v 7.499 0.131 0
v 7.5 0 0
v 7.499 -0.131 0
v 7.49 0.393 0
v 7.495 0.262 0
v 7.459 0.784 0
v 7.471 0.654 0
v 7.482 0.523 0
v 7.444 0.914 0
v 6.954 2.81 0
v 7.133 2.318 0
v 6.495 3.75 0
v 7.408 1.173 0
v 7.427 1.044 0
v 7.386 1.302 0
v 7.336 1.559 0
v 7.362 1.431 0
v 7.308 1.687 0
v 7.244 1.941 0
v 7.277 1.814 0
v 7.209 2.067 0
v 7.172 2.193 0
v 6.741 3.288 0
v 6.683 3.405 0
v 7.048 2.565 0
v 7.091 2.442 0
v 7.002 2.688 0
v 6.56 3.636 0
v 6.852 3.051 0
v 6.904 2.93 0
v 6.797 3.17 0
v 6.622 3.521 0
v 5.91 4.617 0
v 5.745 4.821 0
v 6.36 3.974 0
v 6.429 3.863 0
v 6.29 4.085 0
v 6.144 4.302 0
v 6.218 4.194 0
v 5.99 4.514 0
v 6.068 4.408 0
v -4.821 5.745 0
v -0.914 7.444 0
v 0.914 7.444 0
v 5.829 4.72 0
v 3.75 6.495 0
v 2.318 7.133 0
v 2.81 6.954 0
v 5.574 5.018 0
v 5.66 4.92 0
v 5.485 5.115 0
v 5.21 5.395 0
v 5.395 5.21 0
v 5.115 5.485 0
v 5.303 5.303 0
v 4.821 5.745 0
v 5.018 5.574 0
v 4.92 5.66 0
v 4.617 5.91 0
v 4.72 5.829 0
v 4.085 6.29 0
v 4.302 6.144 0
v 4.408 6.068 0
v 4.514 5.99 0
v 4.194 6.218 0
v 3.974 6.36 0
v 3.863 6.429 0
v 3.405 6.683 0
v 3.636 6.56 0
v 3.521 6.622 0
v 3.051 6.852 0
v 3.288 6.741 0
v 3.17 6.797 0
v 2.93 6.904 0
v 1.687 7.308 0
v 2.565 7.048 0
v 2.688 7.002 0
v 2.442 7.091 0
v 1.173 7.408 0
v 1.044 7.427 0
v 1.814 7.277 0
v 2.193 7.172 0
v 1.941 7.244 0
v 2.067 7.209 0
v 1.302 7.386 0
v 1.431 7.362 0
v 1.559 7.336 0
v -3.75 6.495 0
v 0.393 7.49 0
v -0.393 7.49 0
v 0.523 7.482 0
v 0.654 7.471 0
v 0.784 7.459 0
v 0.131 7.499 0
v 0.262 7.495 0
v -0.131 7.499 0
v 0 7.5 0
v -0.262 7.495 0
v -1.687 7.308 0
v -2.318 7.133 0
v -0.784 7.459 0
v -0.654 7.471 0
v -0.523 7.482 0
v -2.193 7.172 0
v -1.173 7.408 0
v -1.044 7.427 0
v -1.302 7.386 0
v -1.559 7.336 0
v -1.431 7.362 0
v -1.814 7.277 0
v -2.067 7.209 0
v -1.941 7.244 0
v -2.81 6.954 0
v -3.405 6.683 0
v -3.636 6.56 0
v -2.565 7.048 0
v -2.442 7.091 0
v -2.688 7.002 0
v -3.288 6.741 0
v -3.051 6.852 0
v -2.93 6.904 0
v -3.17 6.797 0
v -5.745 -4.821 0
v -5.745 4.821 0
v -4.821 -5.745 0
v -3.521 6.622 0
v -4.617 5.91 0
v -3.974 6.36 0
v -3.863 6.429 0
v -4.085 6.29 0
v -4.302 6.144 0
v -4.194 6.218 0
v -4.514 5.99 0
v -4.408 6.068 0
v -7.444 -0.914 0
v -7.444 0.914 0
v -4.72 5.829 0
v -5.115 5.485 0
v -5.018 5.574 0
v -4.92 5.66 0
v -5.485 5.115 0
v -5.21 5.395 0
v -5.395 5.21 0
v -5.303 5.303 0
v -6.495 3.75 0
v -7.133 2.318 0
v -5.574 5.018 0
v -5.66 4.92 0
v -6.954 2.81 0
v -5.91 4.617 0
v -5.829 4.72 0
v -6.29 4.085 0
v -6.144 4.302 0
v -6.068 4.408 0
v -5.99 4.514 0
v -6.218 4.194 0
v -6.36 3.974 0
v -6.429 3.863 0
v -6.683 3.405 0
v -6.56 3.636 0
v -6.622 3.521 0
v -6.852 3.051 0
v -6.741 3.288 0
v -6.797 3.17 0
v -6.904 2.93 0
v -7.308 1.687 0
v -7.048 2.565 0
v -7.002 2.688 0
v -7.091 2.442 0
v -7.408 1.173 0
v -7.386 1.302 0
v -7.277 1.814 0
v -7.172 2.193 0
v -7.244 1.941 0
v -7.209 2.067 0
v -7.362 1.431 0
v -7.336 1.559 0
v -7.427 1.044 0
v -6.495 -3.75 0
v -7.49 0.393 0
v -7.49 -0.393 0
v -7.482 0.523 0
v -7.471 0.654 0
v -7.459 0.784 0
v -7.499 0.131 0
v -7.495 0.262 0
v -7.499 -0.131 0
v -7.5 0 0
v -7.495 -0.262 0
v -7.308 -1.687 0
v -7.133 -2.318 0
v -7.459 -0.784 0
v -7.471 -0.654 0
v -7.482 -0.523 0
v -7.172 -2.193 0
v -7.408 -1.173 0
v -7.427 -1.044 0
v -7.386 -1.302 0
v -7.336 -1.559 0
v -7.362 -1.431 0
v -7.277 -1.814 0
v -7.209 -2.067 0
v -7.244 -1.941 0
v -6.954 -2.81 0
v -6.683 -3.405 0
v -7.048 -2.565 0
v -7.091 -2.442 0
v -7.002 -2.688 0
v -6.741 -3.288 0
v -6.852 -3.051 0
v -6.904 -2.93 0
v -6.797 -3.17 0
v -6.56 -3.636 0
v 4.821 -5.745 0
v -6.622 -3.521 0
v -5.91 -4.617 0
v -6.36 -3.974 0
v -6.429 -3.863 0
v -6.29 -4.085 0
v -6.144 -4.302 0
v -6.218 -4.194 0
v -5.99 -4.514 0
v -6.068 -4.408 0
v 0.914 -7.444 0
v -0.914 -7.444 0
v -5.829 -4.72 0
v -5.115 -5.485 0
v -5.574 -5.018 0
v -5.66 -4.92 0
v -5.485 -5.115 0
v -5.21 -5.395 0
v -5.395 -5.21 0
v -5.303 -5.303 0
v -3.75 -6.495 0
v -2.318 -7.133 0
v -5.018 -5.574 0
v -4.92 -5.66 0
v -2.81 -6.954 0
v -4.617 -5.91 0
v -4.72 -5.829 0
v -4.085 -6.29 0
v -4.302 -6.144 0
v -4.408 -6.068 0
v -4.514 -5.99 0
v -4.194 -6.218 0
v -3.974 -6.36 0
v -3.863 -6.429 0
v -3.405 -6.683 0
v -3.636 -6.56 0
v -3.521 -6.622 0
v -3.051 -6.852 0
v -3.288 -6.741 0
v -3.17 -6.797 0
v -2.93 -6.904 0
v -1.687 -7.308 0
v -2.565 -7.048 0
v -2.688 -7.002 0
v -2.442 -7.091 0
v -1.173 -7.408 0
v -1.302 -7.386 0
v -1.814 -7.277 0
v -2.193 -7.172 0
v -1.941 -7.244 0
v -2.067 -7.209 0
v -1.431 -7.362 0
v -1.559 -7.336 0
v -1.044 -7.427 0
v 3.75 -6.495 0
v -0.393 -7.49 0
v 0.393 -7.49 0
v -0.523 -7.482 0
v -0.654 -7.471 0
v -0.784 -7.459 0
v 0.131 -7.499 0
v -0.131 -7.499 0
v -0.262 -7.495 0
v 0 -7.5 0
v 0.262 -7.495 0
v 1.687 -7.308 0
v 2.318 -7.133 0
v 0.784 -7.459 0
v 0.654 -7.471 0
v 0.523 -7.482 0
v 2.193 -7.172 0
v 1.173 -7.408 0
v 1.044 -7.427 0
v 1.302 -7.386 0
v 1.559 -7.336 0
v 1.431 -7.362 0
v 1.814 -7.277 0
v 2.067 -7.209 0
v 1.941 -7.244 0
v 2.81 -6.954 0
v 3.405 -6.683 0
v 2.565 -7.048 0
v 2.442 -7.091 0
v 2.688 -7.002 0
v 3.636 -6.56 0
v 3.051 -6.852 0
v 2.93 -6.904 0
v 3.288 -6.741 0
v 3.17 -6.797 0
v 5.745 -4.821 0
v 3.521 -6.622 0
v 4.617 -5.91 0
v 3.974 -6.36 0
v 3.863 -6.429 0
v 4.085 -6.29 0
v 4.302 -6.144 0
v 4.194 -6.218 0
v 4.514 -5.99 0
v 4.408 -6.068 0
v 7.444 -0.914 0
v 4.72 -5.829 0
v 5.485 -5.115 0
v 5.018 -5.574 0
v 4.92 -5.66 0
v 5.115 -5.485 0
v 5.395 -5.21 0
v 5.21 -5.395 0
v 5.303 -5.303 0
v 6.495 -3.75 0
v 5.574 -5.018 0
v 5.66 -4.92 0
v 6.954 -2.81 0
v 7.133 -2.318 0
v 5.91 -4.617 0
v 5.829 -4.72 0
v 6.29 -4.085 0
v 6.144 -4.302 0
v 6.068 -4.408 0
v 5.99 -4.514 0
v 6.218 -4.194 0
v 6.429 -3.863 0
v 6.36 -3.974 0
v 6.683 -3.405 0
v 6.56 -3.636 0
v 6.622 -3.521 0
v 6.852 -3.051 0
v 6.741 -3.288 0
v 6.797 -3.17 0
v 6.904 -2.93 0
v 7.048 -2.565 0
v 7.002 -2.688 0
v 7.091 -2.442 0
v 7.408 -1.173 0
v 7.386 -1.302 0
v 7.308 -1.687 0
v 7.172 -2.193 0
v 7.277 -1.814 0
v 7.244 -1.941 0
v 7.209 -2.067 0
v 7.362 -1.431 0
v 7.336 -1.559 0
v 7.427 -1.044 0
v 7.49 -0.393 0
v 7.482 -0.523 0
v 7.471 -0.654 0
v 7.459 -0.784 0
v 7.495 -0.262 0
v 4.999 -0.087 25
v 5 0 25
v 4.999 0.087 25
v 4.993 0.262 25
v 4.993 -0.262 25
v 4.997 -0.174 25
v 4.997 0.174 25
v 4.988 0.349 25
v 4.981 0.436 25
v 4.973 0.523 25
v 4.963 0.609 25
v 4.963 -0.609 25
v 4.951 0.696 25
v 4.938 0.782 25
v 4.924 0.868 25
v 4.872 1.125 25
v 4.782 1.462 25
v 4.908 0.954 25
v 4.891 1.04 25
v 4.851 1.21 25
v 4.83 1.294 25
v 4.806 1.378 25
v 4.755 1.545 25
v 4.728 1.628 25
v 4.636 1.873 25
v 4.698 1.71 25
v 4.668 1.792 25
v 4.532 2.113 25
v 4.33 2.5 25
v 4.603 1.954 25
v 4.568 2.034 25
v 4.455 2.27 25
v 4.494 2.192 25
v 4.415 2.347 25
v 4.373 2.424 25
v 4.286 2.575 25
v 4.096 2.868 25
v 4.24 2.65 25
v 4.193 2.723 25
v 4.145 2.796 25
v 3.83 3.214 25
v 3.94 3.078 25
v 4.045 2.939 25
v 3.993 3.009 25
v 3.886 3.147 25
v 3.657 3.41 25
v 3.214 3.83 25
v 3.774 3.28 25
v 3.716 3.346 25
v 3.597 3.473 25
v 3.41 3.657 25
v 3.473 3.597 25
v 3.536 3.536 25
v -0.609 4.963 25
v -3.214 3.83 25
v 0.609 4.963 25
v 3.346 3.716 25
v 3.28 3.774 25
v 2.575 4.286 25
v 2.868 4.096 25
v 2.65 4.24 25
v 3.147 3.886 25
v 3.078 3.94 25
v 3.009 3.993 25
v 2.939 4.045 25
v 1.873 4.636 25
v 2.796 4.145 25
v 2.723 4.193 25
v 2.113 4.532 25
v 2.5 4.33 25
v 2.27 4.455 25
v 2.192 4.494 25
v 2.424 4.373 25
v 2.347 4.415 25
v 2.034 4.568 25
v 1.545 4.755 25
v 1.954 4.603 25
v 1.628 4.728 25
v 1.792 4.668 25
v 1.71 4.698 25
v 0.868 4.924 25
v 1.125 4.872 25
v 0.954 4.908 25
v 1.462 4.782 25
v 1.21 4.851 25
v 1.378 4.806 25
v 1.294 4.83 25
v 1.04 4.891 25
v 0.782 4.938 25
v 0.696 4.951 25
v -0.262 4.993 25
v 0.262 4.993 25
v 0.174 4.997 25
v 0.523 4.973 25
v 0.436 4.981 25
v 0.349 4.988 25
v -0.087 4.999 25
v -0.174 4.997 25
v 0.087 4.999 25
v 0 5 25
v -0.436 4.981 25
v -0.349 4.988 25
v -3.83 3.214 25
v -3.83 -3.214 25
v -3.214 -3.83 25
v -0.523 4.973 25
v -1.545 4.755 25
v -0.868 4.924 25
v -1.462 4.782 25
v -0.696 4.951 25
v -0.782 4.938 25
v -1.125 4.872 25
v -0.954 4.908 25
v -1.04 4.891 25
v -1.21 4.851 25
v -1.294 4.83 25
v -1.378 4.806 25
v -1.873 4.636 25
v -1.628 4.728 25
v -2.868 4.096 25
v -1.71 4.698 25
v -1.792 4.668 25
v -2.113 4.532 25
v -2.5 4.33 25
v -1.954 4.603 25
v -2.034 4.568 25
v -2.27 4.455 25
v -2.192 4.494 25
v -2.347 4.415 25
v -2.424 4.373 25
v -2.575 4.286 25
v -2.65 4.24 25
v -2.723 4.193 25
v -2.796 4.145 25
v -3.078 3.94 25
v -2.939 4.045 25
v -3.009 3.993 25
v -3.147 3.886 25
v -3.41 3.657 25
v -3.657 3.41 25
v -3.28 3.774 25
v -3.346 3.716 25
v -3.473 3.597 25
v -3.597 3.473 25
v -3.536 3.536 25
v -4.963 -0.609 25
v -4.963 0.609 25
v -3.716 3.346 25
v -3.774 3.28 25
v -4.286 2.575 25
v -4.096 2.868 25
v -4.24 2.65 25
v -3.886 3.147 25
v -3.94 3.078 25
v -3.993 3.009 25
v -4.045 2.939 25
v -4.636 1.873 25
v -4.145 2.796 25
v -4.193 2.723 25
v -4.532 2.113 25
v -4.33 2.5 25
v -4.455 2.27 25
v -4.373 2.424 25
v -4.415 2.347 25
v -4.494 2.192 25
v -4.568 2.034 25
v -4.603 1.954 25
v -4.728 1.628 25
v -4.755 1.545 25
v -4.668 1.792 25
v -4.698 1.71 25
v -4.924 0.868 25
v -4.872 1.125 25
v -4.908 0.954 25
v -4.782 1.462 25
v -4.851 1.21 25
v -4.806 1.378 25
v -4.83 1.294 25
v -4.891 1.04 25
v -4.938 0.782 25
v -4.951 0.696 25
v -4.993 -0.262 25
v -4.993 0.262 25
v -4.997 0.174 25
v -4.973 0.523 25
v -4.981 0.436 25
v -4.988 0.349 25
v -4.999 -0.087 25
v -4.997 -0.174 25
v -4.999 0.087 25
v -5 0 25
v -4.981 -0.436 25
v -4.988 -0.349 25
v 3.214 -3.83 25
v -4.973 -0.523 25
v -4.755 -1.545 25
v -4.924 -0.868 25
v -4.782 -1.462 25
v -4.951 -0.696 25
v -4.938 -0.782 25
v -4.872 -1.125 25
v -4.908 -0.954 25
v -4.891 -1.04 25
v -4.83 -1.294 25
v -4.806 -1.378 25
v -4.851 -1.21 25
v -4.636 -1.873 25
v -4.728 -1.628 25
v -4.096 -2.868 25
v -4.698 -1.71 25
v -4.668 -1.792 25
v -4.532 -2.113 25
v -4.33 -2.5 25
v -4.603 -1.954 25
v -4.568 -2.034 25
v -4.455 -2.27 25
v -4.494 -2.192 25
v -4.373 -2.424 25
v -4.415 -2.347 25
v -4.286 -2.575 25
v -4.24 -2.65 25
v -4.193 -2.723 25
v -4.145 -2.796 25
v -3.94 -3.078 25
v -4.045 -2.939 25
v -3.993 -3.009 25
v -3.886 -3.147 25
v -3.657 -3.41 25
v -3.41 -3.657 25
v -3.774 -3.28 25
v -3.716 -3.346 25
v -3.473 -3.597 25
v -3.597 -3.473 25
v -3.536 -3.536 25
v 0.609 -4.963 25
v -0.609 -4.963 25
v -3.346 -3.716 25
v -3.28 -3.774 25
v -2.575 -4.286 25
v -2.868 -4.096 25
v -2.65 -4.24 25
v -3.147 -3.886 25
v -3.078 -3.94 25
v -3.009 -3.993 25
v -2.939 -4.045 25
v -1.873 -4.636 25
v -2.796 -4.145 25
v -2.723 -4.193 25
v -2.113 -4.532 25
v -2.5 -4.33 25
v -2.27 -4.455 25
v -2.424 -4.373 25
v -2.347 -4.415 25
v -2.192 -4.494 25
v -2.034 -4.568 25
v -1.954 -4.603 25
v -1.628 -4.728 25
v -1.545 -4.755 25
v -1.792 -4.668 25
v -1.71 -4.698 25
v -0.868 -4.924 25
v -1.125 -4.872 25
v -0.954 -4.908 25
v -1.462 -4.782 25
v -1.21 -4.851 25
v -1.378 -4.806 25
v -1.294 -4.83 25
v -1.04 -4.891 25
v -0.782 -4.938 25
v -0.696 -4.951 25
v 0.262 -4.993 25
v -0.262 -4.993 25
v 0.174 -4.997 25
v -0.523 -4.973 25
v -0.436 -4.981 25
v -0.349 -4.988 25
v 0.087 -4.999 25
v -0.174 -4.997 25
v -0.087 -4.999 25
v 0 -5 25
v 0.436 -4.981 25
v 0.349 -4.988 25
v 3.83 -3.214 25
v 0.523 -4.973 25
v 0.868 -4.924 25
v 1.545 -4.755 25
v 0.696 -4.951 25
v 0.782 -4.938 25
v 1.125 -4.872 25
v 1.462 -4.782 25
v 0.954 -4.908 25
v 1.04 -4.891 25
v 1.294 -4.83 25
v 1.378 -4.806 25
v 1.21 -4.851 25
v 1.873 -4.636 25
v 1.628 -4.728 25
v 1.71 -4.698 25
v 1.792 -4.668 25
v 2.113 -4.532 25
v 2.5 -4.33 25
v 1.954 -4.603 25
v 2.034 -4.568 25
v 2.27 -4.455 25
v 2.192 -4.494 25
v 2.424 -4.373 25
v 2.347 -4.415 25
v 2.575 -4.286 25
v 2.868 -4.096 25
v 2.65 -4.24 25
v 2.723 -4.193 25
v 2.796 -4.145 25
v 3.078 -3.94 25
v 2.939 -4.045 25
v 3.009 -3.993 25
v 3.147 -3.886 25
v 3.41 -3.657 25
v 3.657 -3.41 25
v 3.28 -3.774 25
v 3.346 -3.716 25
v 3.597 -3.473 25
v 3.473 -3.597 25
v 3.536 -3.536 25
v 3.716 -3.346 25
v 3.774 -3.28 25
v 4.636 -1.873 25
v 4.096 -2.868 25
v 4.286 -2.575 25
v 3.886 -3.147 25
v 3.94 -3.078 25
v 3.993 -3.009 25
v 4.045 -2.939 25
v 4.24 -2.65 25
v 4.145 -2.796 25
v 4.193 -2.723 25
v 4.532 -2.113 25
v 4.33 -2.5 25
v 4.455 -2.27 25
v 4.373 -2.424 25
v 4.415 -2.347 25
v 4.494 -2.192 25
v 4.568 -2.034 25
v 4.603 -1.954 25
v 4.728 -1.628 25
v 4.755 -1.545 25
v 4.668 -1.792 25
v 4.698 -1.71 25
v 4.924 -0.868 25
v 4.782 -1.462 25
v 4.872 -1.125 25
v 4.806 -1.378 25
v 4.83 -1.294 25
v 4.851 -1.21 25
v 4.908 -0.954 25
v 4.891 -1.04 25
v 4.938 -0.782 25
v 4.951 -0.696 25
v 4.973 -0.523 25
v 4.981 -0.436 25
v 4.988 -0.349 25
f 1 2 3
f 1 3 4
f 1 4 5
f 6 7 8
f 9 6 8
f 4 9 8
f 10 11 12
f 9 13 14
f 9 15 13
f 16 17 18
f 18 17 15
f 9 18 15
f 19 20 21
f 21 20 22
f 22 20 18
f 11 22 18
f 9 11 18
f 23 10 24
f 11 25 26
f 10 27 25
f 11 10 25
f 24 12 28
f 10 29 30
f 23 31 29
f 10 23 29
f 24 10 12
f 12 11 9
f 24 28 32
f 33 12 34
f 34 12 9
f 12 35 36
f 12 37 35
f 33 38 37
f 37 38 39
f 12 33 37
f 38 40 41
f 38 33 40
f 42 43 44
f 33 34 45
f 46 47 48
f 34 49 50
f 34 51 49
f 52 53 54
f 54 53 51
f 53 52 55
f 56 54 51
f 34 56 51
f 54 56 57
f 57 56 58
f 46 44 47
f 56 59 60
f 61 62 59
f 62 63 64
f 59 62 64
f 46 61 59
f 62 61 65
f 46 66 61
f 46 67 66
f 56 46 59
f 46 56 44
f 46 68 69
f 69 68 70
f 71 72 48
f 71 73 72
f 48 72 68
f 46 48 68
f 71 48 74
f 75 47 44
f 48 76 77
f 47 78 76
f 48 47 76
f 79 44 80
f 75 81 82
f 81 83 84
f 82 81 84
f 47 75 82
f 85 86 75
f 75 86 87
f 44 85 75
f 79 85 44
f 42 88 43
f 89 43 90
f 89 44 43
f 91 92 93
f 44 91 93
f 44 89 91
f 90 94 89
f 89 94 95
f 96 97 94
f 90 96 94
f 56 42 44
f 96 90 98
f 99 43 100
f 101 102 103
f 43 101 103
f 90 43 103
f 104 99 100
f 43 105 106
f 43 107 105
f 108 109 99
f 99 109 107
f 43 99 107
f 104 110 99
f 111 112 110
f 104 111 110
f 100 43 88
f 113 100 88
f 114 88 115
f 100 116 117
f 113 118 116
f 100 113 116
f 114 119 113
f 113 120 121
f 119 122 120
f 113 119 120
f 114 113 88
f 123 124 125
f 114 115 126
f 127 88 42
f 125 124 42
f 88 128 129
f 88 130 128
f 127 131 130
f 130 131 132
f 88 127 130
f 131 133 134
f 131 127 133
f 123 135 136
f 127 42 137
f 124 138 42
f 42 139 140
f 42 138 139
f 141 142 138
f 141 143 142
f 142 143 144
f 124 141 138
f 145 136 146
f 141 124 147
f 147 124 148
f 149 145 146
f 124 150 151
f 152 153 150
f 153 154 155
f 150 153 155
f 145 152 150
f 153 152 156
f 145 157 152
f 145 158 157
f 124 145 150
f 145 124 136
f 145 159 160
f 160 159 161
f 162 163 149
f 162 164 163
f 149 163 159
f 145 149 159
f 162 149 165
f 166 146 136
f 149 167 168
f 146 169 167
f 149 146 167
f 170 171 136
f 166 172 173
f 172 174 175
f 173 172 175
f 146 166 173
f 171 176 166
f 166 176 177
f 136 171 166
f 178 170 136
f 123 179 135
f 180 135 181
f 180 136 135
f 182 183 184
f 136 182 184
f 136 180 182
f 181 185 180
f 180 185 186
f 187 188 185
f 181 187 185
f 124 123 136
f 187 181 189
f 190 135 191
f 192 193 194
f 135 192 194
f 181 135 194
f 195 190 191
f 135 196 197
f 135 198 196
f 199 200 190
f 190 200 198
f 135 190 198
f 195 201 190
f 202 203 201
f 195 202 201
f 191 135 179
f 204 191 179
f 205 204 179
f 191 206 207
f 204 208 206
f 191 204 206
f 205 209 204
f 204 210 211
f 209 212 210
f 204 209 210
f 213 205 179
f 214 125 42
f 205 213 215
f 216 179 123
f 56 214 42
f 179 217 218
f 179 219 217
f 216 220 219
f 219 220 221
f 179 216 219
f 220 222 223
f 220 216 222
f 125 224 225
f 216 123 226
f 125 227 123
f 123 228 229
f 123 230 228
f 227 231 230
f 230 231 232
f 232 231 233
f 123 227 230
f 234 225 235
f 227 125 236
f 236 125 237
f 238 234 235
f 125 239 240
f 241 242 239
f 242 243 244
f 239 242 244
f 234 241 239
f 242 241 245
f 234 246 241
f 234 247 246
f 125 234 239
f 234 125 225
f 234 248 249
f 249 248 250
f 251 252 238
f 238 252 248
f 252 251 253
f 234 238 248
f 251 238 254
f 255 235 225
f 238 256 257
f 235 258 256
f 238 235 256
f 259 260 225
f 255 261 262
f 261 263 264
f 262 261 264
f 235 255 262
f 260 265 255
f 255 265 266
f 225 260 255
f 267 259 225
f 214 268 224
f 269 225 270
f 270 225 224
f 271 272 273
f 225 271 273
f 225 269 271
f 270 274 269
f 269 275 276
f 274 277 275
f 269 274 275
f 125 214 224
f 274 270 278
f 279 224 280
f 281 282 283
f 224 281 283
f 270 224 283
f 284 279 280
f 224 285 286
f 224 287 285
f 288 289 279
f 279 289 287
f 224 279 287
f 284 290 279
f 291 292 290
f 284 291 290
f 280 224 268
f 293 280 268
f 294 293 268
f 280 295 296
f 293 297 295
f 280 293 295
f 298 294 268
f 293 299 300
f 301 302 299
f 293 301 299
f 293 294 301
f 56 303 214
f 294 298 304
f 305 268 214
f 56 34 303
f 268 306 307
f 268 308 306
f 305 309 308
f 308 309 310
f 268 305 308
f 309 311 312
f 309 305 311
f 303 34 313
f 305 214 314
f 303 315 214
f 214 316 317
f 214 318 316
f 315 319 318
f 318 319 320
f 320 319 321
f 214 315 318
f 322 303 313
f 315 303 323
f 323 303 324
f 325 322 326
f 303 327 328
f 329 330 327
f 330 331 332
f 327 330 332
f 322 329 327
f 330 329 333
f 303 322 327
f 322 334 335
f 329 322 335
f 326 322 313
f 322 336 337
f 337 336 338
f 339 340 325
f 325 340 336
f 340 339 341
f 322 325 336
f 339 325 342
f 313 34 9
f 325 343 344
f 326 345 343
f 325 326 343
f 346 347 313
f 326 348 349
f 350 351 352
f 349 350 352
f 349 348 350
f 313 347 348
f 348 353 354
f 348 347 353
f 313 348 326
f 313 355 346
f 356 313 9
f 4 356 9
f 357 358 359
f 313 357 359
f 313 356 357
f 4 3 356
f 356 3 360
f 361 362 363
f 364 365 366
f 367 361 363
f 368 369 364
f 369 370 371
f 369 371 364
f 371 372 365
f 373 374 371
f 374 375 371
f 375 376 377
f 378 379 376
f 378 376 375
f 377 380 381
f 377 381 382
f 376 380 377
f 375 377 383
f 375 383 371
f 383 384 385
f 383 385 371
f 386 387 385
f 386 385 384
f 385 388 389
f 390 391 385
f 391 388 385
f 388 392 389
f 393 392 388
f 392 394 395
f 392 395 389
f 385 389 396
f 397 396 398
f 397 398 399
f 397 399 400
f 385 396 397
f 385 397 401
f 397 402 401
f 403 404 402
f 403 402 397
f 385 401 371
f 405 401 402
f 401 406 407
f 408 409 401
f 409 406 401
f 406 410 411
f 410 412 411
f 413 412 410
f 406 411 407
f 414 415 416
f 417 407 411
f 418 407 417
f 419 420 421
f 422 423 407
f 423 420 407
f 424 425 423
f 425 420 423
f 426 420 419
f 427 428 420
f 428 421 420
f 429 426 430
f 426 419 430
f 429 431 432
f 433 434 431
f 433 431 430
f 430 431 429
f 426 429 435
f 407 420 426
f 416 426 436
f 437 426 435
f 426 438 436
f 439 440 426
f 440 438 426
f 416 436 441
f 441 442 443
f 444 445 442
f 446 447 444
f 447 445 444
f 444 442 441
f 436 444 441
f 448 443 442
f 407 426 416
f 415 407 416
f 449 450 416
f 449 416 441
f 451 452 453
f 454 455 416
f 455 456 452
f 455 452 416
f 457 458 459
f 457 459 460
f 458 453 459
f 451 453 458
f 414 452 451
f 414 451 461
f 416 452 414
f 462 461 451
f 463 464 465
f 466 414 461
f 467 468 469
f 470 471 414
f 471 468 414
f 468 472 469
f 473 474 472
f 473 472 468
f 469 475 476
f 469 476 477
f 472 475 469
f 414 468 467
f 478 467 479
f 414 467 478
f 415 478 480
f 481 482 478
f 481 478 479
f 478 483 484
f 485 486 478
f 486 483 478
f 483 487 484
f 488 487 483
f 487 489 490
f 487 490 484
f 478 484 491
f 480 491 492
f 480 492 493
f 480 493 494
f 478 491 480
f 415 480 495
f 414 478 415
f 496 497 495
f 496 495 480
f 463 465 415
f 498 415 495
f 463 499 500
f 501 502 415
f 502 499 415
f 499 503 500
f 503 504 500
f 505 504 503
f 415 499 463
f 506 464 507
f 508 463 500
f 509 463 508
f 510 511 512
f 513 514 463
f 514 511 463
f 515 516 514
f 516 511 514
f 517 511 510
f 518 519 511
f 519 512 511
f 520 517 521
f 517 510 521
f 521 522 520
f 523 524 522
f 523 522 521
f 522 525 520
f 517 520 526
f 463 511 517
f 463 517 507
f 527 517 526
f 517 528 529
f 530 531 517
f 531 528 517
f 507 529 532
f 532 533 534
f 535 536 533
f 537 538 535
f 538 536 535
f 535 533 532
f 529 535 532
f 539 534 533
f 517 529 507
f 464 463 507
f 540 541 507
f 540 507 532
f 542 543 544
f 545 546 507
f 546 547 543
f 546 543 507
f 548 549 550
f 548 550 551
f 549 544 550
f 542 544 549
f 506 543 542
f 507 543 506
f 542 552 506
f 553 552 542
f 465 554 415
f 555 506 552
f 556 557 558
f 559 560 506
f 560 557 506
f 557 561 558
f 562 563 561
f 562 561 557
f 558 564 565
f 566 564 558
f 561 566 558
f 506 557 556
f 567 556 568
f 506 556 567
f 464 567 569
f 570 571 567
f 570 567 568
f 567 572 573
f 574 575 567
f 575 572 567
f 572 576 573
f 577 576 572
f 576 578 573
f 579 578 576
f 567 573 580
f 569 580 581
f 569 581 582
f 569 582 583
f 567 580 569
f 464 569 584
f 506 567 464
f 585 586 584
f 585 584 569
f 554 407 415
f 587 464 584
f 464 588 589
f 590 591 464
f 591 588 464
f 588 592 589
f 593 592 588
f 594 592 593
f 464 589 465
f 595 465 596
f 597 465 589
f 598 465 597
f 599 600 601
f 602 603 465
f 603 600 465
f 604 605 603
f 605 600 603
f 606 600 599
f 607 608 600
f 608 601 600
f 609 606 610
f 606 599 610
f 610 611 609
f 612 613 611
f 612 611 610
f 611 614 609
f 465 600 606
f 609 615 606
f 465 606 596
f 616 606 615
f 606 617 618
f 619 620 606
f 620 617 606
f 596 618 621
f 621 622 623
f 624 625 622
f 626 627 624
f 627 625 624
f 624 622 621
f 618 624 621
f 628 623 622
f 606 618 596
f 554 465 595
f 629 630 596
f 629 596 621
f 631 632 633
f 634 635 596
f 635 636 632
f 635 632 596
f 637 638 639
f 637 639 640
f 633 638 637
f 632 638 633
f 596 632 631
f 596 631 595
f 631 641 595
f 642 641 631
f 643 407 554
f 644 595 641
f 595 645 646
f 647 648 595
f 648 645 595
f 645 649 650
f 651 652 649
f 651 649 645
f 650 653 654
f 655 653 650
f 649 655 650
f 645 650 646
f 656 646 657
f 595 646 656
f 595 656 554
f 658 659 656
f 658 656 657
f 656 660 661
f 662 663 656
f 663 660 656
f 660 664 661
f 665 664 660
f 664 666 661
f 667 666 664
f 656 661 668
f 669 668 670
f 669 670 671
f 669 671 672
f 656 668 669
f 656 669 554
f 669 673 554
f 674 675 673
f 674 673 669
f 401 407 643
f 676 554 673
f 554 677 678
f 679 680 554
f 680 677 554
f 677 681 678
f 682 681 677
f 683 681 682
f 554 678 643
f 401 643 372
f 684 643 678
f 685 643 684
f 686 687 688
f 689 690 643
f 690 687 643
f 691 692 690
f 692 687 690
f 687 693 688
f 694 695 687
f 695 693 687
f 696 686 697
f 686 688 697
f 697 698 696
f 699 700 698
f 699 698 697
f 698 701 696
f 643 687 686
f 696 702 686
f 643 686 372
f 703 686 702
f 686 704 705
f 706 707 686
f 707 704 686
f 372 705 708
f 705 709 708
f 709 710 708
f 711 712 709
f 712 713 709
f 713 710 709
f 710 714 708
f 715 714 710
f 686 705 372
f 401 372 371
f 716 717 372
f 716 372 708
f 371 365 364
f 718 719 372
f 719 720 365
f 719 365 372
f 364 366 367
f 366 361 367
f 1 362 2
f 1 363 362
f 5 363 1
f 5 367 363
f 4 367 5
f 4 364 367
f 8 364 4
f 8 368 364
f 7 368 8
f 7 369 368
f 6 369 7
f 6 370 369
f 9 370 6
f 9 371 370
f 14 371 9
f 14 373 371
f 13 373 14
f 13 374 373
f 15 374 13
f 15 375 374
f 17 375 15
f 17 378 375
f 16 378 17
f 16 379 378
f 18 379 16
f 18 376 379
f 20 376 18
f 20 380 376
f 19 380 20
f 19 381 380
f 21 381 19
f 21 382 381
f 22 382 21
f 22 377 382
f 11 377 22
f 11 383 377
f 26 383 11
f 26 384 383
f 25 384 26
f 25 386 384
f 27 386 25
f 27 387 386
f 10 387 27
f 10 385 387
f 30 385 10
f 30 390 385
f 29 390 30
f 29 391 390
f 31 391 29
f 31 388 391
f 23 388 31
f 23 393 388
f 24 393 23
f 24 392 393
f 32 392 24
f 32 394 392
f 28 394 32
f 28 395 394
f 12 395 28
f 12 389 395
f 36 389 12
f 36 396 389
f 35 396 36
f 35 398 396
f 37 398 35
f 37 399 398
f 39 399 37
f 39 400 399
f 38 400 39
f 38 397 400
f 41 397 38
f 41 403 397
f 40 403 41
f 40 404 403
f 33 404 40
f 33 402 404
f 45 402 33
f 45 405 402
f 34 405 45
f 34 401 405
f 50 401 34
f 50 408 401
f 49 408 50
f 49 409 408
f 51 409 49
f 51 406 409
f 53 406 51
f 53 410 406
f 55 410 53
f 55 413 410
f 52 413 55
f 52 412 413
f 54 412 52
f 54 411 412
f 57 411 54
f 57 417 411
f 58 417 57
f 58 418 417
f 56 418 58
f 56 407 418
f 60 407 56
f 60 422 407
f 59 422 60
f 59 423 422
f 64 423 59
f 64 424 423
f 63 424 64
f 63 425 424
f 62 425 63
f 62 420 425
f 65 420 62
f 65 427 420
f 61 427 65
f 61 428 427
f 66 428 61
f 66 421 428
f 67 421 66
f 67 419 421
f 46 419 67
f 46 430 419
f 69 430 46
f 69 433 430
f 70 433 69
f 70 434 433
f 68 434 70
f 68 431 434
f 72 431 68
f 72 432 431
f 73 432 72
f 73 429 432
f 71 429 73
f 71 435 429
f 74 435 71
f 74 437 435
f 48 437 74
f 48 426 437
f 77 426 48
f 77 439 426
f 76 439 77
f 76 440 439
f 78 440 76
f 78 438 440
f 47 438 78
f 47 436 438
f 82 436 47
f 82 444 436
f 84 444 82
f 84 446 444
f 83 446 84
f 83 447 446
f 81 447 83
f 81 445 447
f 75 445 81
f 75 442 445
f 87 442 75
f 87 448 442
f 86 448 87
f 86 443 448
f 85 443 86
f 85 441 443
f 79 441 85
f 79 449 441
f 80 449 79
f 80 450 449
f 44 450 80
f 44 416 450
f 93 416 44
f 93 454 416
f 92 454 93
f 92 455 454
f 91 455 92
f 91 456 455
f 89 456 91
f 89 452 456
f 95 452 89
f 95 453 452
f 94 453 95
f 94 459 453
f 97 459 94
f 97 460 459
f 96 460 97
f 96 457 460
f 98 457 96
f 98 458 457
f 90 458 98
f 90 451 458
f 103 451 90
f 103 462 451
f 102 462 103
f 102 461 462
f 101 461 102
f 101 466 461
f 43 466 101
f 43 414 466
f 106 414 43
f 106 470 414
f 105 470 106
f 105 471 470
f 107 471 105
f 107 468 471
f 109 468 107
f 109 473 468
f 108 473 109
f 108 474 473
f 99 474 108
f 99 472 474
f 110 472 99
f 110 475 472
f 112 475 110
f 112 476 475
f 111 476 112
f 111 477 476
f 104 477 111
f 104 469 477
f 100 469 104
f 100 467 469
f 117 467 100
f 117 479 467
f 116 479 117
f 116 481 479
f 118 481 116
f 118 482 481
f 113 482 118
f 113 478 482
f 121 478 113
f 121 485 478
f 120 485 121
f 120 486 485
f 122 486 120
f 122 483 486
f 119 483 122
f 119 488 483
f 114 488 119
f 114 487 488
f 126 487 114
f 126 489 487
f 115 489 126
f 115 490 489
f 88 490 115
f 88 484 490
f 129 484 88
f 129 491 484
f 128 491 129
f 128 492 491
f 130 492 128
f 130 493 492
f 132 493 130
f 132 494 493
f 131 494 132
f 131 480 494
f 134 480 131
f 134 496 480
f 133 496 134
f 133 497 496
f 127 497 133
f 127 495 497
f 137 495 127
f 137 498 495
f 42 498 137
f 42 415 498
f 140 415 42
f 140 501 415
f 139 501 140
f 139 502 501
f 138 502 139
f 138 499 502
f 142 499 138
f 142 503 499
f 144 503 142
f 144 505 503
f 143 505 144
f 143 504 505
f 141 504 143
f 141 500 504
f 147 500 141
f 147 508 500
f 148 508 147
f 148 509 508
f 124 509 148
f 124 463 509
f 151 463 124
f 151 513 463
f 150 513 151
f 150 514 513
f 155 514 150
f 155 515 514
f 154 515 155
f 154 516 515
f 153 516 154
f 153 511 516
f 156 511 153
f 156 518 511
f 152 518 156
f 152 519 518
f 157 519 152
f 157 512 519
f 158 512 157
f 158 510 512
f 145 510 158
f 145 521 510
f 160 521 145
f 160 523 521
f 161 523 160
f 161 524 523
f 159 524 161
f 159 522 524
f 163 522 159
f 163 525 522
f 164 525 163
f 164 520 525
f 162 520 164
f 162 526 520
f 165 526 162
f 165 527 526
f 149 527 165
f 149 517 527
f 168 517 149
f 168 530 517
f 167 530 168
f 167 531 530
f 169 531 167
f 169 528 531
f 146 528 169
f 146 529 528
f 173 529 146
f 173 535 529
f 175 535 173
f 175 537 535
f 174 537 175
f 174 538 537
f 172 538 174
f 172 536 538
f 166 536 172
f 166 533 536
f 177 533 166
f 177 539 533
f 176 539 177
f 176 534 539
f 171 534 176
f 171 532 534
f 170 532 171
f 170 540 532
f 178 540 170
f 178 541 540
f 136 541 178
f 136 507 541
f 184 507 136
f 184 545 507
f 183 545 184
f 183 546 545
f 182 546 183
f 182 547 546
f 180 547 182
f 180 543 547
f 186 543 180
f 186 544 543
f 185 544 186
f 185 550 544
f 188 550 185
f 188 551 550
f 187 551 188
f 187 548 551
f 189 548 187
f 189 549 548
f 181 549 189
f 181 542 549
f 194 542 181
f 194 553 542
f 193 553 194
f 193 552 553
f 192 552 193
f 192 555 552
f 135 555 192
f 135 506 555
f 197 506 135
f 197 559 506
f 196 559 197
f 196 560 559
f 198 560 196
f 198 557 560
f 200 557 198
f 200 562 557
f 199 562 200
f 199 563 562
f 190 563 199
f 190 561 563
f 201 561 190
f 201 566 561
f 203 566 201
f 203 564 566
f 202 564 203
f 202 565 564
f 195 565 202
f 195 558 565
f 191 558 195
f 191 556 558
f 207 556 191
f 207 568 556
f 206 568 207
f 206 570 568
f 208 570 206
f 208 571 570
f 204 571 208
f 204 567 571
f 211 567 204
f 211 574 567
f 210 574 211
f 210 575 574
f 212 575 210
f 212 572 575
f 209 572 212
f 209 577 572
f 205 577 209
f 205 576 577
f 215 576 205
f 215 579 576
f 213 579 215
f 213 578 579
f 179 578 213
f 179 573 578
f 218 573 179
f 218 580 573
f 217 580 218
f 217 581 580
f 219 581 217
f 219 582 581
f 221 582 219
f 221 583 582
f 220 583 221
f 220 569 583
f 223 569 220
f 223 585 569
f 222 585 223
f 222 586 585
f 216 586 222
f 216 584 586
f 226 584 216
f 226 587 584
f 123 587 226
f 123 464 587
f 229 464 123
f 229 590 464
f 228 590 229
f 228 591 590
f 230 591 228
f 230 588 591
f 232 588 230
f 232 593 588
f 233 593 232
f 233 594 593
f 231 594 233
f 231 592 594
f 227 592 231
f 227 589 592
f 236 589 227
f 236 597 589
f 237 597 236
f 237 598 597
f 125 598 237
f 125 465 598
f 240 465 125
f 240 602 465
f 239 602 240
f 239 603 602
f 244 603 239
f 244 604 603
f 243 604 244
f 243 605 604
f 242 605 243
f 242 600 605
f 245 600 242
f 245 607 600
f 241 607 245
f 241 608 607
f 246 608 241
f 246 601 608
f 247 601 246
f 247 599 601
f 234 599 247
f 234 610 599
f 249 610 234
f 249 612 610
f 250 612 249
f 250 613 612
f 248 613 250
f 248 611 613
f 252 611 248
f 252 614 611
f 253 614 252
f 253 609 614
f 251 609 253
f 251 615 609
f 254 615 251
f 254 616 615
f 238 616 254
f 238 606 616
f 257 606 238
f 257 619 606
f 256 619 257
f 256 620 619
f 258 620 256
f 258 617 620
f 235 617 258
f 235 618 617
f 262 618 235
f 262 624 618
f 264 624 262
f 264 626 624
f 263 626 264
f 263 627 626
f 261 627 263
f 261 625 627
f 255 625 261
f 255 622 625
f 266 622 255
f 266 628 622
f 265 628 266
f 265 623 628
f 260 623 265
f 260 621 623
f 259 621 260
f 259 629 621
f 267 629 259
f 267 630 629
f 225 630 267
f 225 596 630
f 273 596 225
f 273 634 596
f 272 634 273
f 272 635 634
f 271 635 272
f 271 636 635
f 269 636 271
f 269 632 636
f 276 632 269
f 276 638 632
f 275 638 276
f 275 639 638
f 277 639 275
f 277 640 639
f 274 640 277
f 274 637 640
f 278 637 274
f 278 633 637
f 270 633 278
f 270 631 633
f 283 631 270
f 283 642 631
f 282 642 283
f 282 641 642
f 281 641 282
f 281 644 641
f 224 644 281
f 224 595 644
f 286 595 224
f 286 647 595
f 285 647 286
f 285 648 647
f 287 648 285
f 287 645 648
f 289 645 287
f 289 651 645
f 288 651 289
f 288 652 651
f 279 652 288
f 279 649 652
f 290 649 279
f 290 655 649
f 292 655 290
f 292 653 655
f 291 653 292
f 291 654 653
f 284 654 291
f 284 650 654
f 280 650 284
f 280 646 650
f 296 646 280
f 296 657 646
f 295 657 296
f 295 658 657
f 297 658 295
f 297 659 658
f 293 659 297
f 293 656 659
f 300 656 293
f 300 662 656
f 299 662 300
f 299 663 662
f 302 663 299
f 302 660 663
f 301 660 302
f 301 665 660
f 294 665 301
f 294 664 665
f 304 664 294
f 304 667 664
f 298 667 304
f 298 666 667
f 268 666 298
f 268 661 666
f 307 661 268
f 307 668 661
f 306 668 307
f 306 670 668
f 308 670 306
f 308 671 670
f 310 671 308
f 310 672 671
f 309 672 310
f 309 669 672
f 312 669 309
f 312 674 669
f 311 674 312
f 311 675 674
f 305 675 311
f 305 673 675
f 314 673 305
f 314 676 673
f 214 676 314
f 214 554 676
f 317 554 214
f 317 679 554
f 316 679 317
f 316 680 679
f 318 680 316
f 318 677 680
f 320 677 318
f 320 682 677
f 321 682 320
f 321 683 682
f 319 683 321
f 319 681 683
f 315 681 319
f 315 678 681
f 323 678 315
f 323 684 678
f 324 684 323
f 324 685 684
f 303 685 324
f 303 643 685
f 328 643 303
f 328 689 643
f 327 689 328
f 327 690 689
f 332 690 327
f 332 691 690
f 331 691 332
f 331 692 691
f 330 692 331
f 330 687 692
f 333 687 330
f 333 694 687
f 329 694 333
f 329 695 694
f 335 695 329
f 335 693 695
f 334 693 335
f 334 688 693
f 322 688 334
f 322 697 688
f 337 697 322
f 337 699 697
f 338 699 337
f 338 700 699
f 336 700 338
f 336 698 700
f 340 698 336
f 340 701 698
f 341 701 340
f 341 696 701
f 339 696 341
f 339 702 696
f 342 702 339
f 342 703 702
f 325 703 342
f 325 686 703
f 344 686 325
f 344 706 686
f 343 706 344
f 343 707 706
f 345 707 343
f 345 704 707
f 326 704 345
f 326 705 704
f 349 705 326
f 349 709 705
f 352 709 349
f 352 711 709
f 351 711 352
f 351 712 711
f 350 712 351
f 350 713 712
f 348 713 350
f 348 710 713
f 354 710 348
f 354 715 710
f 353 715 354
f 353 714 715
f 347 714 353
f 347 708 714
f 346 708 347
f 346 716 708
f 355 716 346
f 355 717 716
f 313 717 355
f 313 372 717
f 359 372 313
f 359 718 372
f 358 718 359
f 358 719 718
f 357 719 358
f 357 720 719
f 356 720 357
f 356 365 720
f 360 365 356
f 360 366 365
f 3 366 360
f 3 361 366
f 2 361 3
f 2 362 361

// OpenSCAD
$fn=360;
d1=10;
d2=15;
h=25;
linear_extrude(h,scale=d1/d2) circle(d=d2);
